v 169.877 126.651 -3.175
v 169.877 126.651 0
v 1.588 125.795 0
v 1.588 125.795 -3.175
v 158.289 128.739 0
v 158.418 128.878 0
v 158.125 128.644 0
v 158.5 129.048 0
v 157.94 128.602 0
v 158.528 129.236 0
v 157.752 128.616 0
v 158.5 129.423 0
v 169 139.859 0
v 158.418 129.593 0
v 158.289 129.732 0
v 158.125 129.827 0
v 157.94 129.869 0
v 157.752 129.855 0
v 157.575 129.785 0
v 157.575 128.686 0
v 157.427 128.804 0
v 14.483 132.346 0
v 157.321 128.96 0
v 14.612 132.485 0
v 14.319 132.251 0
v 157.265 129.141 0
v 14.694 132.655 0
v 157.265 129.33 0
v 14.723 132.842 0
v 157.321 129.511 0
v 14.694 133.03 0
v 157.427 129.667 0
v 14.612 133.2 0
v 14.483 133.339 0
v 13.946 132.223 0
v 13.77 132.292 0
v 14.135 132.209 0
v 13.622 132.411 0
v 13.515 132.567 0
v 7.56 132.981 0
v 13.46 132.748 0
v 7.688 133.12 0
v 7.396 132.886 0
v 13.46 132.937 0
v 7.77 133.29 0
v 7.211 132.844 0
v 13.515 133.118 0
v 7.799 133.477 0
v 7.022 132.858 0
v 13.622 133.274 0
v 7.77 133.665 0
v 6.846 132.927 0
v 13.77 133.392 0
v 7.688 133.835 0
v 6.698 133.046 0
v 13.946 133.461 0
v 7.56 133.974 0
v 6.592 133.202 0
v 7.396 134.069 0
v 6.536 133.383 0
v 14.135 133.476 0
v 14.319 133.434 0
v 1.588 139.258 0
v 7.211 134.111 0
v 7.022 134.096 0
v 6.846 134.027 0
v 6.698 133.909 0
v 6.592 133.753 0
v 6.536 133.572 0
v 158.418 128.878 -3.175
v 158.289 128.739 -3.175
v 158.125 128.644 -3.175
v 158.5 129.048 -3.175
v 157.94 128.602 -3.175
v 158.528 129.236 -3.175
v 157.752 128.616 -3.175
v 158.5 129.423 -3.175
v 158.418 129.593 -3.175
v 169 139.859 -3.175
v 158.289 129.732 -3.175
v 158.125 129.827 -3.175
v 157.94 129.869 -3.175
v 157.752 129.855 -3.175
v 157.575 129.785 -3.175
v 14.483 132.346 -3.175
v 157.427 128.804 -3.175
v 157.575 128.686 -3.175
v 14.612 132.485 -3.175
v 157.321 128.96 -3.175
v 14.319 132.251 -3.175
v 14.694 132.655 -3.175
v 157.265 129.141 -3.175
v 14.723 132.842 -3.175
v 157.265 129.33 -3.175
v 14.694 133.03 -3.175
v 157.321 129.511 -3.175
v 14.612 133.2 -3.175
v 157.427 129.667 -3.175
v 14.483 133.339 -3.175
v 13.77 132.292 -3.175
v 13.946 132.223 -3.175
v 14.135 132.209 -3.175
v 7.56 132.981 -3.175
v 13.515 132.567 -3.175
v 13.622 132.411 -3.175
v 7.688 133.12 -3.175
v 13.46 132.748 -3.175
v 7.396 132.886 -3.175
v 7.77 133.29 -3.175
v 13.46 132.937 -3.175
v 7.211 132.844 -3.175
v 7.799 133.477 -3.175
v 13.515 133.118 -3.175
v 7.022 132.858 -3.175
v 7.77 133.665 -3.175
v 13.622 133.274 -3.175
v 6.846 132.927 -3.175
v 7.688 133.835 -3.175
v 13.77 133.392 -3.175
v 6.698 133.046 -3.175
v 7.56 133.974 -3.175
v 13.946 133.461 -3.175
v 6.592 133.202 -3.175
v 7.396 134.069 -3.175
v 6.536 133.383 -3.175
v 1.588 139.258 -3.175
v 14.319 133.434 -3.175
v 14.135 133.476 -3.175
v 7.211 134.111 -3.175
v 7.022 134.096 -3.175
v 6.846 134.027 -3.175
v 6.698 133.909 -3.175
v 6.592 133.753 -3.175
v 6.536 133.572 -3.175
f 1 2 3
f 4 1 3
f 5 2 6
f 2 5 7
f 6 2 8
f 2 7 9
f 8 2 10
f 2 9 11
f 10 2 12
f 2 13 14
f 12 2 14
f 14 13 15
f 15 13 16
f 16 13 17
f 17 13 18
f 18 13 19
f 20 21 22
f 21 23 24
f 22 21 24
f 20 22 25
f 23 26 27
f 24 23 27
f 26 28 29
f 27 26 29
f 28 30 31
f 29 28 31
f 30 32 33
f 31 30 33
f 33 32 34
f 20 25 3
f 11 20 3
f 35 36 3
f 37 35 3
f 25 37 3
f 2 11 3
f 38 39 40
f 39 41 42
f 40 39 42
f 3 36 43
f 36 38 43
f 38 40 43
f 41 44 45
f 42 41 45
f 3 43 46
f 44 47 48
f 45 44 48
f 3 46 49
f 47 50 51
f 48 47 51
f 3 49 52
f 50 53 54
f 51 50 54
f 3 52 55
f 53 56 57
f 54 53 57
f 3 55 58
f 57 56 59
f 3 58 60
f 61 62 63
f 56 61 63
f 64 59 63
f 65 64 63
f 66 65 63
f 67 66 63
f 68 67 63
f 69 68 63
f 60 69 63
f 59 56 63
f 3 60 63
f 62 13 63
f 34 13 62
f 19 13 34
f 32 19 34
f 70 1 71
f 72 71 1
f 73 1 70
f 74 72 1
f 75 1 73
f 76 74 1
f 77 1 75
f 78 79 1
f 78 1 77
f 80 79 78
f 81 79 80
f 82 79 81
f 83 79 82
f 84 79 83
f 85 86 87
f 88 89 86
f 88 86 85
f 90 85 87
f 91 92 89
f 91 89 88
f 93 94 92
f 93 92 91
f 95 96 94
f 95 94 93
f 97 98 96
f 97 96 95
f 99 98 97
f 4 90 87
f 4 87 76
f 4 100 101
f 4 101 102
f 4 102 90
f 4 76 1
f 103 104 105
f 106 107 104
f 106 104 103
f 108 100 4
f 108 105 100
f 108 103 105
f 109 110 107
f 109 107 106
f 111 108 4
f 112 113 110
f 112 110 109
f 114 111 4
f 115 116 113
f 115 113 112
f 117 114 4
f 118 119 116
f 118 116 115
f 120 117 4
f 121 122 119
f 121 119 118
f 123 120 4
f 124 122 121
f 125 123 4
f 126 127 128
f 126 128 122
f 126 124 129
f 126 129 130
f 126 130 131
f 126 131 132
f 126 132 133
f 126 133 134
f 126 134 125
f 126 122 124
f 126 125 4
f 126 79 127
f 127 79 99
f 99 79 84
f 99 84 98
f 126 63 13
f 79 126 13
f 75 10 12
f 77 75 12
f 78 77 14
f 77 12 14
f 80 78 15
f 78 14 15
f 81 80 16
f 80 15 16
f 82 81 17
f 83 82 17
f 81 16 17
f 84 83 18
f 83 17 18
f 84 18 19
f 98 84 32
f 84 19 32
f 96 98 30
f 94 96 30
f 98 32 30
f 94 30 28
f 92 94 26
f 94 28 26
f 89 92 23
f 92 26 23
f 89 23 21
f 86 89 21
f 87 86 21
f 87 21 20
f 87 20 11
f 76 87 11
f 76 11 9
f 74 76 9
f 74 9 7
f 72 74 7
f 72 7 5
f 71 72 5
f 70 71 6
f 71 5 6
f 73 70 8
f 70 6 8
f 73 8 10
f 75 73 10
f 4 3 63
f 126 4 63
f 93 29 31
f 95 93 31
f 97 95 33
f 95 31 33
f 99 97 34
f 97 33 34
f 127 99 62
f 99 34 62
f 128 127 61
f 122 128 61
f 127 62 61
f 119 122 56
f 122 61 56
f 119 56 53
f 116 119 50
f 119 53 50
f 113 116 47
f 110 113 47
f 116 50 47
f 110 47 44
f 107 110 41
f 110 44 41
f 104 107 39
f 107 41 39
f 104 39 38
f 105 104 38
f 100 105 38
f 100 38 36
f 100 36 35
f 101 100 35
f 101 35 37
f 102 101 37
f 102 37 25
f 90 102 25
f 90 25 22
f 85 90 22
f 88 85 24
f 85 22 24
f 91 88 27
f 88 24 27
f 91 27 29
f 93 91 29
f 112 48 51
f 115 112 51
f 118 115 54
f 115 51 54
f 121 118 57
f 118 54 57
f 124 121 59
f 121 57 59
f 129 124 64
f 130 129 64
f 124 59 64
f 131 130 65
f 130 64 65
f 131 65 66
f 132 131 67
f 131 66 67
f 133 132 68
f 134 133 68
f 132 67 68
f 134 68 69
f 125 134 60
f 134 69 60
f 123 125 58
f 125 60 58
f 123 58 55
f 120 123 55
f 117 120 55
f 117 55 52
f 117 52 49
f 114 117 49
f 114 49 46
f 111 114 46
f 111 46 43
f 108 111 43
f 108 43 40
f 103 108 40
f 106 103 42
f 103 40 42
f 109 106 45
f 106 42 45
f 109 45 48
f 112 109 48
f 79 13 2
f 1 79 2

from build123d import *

# Parameters (mm, degrees)
SKETCH1_R           = 0.635
BOSS_EXTRUDE1_DEPTH = 3.175


with BuildPart() as part:
    # Sketch1 → Boss-Extrude1 (new body)
    with BuildSketch(Plane.XY):
        Polygon((169.876910838, 126.650867177), (1.5875, 125.794558197), (1.5875, 139.257710065), (169.000191682, 139.858675371), align=None)
        with Locations((157.892850269, 129.235572603)):
            Circle(SKETCH1_R, mode=Mode.SUBTRACT)
        with Locations((14.087503577, 132.842415442)):
            Circle(SKETCH1_R, mode=Mode.SUBTRACT)
        with Locations((7.163696951, 133.477415442)):
            Circle(SKETCH1_R, mode=Mode.SUBTRACT)
    extrude(amount=-BOSS_EXTRUDE1_DEPTH)


solid = part.part
